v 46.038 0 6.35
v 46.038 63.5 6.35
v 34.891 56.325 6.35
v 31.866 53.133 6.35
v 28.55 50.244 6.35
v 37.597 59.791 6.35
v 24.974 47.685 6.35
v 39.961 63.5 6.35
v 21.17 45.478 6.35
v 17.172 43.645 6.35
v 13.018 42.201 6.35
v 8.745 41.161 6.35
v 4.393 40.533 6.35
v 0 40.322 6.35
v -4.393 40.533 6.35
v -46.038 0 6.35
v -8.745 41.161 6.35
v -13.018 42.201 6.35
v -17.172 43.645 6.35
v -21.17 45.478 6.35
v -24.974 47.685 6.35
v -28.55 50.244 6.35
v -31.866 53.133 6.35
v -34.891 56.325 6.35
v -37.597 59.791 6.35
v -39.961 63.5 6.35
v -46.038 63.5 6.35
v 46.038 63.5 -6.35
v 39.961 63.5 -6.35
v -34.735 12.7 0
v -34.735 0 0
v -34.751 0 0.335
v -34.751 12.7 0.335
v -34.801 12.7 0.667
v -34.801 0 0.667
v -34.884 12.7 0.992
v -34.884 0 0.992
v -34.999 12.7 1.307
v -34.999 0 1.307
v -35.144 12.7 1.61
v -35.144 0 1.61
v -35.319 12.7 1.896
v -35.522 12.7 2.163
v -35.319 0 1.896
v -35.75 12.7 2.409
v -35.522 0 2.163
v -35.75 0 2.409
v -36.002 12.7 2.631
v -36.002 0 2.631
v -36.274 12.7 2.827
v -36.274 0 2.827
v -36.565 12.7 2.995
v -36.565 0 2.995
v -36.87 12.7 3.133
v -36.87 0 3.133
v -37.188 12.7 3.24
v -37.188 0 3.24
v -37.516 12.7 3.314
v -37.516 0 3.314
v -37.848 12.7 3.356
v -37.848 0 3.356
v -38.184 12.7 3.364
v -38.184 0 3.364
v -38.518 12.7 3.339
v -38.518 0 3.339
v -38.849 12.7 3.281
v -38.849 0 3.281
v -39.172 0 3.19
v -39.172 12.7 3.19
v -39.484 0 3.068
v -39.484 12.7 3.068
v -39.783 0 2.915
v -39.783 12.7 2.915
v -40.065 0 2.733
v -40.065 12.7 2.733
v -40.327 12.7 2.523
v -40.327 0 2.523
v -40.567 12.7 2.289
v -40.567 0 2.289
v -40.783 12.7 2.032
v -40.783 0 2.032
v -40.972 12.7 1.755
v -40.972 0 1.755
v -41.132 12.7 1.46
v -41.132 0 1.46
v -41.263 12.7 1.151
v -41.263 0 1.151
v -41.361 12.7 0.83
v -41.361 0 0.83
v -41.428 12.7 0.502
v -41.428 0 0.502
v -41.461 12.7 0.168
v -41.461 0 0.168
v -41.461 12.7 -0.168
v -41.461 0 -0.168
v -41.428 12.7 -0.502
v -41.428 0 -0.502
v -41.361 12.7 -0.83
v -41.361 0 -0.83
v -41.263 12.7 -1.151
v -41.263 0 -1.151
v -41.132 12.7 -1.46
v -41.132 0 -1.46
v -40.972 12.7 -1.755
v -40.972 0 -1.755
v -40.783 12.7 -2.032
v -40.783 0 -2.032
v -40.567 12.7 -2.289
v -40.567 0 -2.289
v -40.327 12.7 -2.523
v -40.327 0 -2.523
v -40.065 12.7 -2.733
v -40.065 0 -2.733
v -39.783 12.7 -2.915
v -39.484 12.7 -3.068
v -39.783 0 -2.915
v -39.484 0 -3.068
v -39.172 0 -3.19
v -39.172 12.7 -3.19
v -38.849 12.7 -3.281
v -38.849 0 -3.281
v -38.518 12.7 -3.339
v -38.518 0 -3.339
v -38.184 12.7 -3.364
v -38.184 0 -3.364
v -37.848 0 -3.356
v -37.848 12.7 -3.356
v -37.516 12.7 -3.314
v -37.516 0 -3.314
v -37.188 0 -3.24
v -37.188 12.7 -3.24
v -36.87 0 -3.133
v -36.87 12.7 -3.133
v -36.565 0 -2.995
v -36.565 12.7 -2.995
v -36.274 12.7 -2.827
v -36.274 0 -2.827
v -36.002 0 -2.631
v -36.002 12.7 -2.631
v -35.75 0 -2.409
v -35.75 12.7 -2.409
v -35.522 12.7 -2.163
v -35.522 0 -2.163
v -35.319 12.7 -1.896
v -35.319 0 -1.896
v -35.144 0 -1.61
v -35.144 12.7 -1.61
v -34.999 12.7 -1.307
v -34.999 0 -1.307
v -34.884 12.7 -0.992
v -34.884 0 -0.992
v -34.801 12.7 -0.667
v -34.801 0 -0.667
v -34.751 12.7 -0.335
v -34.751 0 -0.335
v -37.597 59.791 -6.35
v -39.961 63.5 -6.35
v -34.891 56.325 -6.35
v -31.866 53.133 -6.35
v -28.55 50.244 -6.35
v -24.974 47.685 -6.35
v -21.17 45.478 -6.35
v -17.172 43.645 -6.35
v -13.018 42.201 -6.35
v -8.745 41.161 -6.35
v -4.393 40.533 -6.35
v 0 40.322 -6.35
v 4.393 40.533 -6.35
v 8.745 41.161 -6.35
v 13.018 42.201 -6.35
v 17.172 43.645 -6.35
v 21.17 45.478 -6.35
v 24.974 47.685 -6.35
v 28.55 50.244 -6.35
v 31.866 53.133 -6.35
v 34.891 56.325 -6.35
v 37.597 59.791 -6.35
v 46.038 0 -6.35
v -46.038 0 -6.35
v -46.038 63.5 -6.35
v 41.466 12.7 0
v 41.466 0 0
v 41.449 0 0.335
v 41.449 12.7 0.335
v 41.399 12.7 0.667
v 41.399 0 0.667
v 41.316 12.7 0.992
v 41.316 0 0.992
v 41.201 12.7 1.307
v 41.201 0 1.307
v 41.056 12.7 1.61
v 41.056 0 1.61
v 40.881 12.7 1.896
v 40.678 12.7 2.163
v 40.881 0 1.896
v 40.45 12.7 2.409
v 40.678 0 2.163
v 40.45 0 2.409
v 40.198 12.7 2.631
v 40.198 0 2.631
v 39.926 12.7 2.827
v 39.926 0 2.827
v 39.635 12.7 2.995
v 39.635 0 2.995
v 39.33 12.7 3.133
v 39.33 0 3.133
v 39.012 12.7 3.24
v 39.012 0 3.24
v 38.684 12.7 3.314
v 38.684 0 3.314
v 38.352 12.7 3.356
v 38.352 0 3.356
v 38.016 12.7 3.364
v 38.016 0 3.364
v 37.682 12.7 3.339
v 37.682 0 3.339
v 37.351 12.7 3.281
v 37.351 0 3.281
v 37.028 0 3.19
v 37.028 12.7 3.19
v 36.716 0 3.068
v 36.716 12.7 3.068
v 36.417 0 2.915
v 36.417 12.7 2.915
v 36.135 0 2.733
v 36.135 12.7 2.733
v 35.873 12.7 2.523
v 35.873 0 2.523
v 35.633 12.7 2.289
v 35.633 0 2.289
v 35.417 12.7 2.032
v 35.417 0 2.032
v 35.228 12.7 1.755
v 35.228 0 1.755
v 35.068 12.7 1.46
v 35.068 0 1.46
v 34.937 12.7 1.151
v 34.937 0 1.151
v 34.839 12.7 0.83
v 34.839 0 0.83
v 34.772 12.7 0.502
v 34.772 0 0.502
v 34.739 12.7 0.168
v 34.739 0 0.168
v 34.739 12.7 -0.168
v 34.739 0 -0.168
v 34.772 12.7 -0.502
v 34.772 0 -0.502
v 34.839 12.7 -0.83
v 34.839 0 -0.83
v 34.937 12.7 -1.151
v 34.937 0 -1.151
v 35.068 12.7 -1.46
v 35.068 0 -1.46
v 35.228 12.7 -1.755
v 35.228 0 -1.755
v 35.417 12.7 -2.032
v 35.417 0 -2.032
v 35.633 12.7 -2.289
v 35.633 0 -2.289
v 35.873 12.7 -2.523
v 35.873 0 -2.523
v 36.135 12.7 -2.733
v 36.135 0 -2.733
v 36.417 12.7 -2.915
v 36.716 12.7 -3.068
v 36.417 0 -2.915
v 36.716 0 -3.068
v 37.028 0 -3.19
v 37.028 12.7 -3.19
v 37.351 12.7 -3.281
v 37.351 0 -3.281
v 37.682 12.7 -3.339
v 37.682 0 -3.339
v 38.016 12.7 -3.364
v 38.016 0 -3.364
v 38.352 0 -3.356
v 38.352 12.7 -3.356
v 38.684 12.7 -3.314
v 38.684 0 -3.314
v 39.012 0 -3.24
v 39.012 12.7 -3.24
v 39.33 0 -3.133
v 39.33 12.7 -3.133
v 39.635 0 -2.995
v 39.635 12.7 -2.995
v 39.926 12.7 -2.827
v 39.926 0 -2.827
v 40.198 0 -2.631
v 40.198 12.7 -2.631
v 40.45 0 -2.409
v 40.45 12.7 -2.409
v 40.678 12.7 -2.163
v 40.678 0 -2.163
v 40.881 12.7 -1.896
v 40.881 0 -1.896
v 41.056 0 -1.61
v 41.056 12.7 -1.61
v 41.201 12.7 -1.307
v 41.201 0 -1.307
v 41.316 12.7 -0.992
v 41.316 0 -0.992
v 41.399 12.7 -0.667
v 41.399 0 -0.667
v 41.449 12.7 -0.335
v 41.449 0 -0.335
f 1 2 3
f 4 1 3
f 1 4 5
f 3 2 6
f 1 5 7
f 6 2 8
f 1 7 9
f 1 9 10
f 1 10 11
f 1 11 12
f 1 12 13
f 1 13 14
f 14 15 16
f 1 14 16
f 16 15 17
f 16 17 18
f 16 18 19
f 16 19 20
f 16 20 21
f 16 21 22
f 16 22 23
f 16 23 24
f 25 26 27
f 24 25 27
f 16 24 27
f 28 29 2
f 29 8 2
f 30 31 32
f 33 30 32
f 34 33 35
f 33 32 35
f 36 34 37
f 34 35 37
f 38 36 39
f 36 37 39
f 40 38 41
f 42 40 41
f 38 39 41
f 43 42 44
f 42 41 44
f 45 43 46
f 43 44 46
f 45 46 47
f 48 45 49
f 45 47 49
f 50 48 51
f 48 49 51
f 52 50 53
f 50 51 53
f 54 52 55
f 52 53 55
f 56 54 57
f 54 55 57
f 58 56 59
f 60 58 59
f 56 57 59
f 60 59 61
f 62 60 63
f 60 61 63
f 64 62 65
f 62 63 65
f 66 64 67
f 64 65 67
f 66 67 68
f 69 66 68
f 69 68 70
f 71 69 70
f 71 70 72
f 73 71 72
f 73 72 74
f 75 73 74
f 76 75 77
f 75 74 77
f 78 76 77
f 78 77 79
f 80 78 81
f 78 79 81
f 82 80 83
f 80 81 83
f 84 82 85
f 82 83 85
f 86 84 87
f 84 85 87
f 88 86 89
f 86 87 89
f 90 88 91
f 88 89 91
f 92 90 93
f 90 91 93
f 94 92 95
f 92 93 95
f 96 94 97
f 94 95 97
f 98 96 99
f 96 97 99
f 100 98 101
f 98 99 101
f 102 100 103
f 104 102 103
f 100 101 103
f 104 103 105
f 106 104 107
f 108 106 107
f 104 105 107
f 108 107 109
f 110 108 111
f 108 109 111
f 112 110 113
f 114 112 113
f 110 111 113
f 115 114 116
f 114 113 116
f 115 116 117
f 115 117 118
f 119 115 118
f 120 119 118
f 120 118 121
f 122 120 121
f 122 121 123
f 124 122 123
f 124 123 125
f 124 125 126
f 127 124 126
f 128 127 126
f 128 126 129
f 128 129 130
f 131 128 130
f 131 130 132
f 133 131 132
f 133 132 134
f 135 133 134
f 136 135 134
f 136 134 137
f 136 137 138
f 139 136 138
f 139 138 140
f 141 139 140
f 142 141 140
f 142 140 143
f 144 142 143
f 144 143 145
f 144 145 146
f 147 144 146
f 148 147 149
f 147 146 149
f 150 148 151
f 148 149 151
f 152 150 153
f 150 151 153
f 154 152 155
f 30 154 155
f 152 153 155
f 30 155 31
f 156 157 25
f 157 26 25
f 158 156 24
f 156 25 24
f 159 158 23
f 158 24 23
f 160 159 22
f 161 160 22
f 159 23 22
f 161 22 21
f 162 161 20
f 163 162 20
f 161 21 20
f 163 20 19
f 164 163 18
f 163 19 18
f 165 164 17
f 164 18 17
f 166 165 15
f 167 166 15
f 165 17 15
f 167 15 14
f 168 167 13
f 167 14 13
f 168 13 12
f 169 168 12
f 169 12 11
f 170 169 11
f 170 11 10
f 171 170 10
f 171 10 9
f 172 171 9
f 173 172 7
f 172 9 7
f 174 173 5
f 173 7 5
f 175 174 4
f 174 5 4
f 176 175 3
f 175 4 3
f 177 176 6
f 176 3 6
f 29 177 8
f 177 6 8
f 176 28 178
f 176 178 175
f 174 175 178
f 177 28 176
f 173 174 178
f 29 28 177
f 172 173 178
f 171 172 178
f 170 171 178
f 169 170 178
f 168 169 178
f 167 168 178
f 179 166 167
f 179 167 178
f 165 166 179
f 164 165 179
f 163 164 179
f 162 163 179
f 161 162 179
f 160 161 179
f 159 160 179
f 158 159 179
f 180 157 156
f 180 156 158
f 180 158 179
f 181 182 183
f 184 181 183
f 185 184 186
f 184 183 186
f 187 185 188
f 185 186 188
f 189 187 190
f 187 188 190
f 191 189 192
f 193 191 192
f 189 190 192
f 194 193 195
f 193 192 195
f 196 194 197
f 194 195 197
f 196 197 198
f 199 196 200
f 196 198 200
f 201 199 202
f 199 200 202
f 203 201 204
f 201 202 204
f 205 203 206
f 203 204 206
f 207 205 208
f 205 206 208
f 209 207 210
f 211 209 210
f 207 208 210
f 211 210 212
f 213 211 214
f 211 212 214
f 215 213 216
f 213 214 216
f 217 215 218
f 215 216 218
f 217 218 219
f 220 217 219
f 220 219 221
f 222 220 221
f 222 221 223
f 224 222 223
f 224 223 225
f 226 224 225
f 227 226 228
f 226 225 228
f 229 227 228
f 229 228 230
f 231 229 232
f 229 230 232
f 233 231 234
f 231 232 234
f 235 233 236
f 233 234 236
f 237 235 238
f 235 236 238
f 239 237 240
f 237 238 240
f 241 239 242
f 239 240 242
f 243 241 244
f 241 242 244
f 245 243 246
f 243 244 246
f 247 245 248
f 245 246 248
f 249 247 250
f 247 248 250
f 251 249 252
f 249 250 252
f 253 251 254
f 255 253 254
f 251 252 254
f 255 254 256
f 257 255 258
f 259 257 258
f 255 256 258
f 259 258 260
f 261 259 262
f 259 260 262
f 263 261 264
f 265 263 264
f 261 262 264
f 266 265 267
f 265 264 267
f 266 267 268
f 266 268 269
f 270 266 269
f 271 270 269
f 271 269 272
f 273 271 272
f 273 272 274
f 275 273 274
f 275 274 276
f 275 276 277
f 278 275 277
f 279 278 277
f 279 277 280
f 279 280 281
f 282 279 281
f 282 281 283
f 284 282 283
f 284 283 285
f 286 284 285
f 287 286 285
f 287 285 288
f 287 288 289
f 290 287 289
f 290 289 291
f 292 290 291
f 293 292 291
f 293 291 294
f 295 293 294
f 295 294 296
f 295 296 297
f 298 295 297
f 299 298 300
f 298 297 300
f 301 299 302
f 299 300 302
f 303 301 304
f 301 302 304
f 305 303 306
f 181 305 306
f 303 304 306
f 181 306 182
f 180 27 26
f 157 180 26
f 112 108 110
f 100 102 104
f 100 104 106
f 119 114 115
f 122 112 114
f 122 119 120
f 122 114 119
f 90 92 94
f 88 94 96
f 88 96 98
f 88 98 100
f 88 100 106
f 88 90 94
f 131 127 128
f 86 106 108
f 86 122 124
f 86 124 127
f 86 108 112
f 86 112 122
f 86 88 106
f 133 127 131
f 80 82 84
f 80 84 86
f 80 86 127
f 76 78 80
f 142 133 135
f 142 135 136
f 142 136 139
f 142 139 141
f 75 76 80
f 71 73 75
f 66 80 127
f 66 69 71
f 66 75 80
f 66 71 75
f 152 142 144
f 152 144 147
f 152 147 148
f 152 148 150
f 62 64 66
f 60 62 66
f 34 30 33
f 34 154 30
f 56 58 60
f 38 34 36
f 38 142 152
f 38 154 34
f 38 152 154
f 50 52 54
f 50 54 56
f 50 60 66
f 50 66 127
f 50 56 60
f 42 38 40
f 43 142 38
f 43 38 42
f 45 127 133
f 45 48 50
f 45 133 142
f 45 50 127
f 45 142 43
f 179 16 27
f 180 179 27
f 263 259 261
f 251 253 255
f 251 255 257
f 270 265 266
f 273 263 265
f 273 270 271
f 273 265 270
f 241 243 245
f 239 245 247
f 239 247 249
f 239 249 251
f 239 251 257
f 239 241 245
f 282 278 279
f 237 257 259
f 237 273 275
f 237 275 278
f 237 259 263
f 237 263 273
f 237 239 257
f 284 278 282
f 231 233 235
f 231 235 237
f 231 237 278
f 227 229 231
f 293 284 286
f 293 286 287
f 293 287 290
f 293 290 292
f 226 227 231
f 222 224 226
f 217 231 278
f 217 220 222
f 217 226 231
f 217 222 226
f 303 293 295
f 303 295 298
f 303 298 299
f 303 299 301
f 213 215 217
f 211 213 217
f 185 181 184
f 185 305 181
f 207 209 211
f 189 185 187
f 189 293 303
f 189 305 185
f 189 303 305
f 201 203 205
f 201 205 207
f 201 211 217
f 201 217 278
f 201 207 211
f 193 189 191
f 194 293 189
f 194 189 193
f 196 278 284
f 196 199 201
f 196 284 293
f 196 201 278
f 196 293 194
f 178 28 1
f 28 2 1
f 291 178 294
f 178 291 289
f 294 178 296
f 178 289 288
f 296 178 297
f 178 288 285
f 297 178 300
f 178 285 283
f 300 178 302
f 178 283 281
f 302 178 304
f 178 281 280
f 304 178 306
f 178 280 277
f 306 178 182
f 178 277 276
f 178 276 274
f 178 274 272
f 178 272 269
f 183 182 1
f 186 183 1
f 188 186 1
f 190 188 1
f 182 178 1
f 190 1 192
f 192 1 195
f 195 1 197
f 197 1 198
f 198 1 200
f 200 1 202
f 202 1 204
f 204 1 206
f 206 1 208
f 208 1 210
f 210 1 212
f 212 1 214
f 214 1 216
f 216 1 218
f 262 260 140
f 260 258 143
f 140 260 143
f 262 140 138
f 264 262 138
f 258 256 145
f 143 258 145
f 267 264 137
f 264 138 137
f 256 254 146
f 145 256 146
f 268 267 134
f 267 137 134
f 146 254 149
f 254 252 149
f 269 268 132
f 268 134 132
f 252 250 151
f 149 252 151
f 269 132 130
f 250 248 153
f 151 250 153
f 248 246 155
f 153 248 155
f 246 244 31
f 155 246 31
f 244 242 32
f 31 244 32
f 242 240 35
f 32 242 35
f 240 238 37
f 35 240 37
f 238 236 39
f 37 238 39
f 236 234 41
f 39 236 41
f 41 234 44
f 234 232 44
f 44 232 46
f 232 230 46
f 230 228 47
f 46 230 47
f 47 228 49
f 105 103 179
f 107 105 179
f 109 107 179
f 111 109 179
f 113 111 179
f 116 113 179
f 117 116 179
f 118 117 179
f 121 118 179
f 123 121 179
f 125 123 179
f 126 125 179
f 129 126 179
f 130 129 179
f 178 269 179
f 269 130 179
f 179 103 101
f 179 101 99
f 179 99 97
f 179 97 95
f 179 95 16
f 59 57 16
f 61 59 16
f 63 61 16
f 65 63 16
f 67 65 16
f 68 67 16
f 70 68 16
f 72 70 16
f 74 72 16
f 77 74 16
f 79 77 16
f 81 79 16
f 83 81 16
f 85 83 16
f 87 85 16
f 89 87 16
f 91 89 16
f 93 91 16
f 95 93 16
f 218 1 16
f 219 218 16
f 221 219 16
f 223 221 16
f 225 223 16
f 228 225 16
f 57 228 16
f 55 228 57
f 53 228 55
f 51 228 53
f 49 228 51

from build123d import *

# Parameters (mm, degrees)
BOSS_EXTRUDE1_DEPTH = 6.35
SKETCH2_R           = 3.3655
CUT_EXTRUDE1_DEPTH  = 12.7


with BuildPart() as part:
    # Sketch1 → Boss-Extrude1 (new body, symmetric)
    with BuildSketch(Plane.XY):
        with BuildLine():
            Line((-46.0375, 63.5), (-39.960878447, 63.5))
            ThreePointArc((-39.960878447, 63.5), (0, 40.3225), (39.960878447, 63.5))
            Line((39.960878447, 63.5), (46.0375, 63.5))
            Line((46.0375, 63.5), (46.0375, 0))
            Line((46.0375, 0), (-46.0375, 0))
            Line((-46.0375, 0), (-46.0375, 63.5))
        make_face()
    extrude(amount=BOSS_EXTRUDE1_DEPTH, both=True)

    # Sketch2 → Cut-Extrude1 (cut)
    with BuildSketch(Plane.XZ):
        with Locations((-38.1, 0)):
            Circle(SKETCH2_R)
        with Locations((38.1, 0)):
            Circle(SKETCH2_R)
    extrude(amount=-CUT_EXTRUDE1_DEPTH, mode=Mode.SUBTRACT)


solid = part.part
